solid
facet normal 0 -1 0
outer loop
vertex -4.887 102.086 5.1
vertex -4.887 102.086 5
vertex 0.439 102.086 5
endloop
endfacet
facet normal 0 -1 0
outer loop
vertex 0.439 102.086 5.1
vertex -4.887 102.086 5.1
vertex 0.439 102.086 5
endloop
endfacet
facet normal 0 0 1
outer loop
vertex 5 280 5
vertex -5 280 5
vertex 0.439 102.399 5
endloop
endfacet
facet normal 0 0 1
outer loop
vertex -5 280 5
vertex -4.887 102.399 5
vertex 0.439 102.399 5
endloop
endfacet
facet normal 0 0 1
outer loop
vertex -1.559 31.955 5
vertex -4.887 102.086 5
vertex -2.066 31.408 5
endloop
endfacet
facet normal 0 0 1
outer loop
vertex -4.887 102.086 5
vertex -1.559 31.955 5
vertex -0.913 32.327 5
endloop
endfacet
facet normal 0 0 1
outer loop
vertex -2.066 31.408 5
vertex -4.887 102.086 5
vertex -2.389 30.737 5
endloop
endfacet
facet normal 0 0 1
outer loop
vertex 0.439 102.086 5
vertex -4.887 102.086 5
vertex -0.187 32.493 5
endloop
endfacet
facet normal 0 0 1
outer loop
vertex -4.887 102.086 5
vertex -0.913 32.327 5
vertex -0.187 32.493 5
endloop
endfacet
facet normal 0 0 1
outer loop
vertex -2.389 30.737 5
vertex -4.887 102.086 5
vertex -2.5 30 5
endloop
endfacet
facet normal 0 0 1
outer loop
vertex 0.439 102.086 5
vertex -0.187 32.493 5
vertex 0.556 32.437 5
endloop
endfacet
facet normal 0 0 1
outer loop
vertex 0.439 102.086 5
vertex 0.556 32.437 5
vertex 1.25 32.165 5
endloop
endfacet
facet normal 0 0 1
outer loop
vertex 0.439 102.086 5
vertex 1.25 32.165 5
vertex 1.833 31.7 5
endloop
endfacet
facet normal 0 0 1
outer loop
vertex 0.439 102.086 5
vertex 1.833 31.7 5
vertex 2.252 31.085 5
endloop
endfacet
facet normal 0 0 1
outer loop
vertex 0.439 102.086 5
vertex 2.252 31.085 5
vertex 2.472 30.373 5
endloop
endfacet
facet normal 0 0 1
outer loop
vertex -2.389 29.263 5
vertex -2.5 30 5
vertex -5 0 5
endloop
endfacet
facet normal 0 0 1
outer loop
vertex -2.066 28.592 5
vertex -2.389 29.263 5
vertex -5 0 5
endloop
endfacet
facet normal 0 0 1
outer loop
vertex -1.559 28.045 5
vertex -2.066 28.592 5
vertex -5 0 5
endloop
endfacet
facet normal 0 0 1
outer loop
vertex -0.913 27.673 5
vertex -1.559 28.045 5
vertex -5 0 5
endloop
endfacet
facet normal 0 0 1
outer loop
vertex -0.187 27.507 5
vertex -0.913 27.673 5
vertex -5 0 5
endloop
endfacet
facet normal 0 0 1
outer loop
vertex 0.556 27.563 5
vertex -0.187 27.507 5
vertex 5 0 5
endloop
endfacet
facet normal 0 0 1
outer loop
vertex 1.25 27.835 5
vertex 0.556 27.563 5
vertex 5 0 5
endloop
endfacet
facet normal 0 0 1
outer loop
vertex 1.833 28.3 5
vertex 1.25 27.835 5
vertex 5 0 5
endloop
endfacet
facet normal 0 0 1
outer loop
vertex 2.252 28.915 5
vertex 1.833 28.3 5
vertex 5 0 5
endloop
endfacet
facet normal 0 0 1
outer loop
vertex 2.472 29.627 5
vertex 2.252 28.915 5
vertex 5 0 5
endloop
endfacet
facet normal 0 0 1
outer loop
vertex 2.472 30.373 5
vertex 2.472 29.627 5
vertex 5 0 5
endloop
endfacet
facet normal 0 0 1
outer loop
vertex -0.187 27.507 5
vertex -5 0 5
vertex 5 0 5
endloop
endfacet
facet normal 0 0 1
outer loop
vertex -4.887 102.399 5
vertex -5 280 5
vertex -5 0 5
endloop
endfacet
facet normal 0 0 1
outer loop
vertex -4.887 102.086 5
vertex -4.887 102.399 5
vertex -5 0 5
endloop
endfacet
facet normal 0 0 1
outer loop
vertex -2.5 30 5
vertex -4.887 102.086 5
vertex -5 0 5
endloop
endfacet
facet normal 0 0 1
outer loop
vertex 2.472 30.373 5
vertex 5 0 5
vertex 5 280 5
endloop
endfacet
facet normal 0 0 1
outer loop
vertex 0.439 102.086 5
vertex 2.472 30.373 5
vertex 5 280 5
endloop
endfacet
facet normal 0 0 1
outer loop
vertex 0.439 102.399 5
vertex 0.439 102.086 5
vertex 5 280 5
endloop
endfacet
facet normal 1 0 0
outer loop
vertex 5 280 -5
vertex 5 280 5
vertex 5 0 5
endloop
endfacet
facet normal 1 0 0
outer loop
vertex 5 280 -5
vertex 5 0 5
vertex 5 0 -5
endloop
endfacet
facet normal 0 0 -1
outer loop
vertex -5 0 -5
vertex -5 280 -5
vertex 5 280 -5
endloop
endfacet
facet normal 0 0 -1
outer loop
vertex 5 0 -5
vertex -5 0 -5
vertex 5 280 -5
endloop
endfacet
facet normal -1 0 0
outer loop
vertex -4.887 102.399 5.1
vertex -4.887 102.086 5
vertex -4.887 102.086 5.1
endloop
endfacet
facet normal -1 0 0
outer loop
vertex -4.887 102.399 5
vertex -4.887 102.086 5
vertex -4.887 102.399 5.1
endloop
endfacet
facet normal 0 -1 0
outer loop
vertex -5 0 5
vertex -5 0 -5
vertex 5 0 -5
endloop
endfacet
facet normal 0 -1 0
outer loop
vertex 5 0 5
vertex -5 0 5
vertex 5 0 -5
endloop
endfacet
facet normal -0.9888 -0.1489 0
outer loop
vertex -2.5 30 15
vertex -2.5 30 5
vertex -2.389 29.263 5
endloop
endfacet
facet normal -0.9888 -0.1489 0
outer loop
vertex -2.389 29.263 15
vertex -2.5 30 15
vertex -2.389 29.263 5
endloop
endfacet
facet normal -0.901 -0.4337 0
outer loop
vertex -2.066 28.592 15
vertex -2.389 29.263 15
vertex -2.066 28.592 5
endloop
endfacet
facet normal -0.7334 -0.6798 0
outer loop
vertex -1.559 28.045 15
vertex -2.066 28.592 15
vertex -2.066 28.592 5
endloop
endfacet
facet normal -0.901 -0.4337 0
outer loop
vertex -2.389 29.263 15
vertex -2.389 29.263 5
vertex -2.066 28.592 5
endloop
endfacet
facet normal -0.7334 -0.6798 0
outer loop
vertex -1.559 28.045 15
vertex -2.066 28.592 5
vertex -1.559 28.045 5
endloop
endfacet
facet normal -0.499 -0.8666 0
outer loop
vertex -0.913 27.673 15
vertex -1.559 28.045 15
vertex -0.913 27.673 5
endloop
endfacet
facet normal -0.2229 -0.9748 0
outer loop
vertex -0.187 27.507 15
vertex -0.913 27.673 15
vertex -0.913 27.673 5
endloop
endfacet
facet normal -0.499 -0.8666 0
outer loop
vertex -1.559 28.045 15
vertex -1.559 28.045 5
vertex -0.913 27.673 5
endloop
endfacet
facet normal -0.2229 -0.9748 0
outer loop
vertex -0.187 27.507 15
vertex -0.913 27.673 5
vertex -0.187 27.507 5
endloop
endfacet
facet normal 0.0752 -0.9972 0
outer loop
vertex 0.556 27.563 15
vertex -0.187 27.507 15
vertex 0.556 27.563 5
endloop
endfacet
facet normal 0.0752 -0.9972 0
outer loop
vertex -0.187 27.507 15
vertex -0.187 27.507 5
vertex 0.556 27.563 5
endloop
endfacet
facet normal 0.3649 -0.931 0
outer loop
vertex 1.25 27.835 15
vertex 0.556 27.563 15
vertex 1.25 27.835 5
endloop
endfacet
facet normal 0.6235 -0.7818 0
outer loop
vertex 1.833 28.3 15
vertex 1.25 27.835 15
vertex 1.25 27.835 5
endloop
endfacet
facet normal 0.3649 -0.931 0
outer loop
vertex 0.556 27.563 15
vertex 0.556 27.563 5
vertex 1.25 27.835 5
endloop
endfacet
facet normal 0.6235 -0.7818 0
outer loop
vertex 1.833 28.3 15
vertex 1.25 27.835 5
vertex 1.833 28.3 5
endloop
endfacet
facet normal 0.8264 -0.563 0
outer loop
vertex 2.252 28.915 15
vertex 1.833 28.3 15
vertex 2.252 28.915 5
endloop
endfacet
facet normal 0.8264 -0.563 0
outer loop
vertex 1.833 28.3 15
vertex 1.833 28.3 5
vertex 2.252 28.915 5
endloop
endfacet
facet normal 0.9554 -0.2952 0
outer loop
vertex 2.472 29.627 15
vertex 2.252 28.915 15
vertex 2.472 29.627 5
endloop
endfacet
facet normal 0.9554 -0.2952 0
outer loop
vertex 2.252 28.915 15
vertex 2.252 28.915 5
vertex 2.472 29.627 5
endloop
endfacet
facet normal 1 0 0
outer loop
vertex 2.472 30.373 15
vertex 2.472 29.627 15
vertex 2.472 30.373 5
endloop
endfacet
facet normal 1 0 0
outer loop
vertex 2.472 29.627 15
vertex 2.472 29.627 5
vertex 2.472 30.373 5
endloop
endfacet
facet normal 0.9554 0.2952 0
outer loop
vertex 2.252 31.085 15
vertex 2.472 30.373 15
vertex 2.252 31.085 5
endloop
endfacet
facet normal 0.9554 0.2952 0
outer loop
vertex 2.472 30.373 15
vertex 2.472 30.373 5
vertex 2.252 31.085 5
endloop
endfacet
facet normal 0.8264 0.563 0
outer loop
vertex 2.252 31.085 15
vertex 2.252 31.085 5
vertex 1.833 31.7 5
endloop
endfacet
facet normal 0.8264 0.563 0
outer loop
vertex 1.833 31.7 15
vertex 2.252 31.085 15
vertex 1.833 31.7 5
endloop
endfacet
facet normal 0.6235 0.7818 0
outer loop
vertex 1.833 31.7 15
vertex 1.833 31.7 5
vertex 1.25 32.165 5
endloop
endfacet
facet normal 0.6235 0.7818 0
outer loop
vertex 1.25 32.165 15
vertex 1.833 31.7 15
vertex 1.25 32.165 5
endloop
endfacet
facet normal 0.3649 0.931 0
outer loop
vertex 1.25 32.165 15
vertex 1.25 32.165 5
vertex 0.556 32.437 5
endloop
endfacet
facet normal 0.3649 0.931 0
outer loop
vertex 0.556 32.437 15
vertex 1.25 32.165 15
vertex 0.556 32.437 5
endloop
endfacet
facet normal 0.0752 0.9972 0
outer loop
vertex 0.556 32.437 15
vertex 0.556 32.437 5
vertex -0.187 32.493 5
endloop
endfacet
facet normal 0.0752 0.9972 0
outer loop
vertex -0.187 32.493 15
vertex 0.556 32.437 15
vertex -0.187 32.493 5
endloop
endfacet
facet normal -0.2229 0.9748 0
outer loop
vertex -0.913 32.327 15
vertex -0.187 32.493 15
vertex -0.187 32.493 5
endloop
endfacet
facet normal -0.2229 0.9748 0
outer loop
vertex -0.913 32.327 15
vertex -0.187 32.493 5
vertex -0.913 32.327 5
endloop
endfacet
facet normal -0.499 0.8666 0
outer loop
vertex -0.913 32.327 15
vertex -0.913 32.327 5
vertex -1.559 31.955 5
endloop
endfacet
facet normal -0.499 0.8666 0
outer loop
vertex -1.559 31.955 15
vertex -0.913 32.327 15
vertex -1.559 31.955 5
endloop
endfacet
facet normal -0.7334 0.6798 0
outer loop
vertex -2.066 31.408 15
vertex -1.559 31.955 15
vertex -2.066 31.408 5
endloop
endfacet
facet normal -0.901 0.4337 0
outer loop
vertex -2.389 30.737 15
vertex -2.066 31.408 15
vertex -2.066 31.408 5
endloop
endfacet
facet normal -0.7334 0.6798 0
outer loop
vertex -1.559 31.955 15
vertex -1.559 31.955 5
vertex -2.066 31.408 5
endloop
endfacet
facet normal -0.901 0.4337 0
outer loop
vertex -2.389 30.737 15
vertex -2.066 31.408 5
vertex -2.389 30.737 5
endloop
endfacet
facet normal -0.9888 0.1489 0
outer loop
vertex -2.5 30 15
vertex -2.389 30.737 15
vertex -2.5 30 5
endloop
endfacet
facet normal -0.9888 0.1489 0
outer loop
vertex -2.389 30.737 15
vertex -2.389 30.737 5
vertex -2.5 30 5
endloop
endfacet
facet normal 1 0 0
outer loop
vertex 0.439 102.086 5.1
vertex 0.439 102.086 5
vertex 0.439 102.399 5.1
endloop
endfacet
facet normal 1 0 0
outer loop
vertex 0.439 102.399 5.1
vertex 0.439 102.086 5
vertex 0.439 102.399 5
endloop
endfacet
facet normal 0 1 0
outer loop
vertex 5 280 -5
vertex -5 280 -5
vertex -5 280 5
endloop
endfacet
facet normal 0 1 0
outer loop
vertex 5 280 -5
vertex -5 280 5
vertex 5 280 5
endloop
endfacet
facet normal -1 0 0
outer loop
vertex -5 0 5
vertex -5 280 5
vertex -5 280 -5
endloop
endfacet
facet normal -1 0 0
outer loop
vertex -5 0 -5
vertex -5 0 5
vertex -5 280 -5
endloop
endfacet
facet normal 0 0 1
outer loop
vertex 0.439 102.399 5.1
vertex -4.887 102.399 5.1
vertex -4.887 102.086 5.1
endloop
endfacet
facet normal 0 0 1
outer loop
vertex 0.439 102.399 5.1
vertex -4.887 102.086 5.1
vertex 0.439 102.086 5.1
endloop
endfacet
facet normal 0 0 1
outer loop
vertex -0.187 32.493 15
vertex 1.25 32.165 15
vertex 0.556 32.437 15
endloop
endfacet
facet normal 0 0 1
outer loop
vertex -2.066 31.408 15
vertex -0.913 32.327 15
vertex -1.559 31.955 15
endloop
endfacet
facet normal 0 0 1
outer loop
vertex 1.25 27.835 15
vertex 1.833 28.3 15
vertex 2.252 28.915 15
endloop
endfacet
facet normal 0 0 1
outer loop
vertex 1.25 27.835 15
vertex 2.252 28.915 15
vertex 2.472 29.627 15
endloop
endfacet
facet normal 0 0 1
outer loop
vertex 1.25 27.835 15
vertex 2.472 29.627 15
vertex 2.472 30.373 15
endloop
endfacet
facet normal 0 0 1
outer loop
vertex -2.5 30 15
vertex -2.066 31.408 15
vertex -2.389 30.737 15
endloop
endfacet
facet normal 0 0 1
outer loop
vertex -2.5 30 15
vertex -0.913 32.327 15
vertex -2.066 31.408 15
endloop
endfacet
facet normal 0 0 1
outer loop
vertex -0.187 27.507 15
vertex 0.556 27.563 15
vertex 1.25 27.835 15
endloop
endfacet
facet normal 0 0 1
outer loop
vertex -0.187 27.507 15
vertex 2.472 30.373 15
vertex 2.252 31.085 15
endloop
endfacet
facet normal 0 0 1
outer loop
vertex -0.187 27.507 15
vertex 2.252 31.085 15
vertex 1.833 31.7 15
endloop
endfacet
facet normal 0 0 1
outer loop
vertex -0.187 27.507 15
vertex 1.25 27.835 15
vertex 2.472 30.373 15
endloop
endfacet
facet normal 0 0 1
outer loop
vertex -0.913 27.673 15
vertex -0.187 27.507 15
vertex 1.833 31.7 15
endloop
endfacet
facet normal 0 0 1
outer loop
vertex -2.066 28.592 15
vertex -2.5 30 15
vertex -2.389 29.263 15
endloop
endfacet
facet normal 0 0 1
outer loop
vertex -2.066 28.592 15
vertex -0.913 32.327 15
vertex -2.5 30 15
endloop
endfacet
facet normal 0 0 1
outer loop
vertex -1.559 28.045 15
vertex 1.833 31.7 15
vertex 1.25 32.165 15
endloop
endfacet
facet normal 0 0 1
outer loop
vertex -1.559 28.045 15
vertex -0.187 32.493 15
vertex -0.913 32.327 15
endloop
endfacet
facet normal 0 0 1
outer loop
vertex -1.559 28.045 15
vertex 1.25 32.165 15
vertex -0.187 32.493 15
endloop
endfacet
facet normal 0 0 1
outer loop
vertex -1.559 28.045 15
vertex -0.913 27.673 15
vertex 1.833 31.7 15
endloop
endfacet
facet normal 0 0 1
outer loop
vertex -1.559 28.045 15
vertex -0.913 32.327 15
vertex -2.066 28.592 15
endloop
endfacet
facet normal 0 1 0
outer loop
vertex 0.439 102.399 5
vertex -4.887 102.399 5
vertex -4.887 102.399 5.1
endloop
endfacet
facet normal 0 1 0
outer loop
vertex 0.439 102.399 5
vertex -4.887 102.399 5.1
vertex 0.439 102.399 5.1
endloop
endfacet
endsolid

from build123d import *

# Parameters (mm, degrees)
SKETCH_1_W      = 10
SKETCH_1_H      = 10
EXTRUDE_1_DEPTH = 280
SKETCH_2_R      = 2.5
EXTRUDE_2_DEPTH = 10
SKETCH_3_W      = 5.326066841
SKETCH_3_H      = 0.31329805
EXTRUDE_3_DEPTH = 0.1


with BuildPart() as part:
    # 草图1 → 凸台-拉伸1 (new body)
    with BuildSketch(Plane(origin=(0, 0, 0), x_dir=(1, 0, 0), z_dir=(0, 1, 0))):
        Rectangle(SKETCH_1_W, SKETCH_1_H)
    extrude(amount=EXTRUDE_1_DEPTH)

    # 草图2 → 凸台-拉伸2 (add)
    with BuildSketch(Plane.XY.offset(5)):
        with Locations(Location((0, 30, 0), (0, 0, 180))):
            Circle(SKETCH_2_R)
    extrude(amount=EXTRUDE_2_DEPTH)

    # 草图3 → 凸台-拉伸3 (add)
    with BuildSketch(Plane.XY.offset(5)):
        with Locations((-2.223790566, 102.242298207)):
            Rectangle(SKETCH_3_W, SKETCH_3_H)
    extrude(amount=EXTRUDE_3_DEPTH)


solid = part.part
